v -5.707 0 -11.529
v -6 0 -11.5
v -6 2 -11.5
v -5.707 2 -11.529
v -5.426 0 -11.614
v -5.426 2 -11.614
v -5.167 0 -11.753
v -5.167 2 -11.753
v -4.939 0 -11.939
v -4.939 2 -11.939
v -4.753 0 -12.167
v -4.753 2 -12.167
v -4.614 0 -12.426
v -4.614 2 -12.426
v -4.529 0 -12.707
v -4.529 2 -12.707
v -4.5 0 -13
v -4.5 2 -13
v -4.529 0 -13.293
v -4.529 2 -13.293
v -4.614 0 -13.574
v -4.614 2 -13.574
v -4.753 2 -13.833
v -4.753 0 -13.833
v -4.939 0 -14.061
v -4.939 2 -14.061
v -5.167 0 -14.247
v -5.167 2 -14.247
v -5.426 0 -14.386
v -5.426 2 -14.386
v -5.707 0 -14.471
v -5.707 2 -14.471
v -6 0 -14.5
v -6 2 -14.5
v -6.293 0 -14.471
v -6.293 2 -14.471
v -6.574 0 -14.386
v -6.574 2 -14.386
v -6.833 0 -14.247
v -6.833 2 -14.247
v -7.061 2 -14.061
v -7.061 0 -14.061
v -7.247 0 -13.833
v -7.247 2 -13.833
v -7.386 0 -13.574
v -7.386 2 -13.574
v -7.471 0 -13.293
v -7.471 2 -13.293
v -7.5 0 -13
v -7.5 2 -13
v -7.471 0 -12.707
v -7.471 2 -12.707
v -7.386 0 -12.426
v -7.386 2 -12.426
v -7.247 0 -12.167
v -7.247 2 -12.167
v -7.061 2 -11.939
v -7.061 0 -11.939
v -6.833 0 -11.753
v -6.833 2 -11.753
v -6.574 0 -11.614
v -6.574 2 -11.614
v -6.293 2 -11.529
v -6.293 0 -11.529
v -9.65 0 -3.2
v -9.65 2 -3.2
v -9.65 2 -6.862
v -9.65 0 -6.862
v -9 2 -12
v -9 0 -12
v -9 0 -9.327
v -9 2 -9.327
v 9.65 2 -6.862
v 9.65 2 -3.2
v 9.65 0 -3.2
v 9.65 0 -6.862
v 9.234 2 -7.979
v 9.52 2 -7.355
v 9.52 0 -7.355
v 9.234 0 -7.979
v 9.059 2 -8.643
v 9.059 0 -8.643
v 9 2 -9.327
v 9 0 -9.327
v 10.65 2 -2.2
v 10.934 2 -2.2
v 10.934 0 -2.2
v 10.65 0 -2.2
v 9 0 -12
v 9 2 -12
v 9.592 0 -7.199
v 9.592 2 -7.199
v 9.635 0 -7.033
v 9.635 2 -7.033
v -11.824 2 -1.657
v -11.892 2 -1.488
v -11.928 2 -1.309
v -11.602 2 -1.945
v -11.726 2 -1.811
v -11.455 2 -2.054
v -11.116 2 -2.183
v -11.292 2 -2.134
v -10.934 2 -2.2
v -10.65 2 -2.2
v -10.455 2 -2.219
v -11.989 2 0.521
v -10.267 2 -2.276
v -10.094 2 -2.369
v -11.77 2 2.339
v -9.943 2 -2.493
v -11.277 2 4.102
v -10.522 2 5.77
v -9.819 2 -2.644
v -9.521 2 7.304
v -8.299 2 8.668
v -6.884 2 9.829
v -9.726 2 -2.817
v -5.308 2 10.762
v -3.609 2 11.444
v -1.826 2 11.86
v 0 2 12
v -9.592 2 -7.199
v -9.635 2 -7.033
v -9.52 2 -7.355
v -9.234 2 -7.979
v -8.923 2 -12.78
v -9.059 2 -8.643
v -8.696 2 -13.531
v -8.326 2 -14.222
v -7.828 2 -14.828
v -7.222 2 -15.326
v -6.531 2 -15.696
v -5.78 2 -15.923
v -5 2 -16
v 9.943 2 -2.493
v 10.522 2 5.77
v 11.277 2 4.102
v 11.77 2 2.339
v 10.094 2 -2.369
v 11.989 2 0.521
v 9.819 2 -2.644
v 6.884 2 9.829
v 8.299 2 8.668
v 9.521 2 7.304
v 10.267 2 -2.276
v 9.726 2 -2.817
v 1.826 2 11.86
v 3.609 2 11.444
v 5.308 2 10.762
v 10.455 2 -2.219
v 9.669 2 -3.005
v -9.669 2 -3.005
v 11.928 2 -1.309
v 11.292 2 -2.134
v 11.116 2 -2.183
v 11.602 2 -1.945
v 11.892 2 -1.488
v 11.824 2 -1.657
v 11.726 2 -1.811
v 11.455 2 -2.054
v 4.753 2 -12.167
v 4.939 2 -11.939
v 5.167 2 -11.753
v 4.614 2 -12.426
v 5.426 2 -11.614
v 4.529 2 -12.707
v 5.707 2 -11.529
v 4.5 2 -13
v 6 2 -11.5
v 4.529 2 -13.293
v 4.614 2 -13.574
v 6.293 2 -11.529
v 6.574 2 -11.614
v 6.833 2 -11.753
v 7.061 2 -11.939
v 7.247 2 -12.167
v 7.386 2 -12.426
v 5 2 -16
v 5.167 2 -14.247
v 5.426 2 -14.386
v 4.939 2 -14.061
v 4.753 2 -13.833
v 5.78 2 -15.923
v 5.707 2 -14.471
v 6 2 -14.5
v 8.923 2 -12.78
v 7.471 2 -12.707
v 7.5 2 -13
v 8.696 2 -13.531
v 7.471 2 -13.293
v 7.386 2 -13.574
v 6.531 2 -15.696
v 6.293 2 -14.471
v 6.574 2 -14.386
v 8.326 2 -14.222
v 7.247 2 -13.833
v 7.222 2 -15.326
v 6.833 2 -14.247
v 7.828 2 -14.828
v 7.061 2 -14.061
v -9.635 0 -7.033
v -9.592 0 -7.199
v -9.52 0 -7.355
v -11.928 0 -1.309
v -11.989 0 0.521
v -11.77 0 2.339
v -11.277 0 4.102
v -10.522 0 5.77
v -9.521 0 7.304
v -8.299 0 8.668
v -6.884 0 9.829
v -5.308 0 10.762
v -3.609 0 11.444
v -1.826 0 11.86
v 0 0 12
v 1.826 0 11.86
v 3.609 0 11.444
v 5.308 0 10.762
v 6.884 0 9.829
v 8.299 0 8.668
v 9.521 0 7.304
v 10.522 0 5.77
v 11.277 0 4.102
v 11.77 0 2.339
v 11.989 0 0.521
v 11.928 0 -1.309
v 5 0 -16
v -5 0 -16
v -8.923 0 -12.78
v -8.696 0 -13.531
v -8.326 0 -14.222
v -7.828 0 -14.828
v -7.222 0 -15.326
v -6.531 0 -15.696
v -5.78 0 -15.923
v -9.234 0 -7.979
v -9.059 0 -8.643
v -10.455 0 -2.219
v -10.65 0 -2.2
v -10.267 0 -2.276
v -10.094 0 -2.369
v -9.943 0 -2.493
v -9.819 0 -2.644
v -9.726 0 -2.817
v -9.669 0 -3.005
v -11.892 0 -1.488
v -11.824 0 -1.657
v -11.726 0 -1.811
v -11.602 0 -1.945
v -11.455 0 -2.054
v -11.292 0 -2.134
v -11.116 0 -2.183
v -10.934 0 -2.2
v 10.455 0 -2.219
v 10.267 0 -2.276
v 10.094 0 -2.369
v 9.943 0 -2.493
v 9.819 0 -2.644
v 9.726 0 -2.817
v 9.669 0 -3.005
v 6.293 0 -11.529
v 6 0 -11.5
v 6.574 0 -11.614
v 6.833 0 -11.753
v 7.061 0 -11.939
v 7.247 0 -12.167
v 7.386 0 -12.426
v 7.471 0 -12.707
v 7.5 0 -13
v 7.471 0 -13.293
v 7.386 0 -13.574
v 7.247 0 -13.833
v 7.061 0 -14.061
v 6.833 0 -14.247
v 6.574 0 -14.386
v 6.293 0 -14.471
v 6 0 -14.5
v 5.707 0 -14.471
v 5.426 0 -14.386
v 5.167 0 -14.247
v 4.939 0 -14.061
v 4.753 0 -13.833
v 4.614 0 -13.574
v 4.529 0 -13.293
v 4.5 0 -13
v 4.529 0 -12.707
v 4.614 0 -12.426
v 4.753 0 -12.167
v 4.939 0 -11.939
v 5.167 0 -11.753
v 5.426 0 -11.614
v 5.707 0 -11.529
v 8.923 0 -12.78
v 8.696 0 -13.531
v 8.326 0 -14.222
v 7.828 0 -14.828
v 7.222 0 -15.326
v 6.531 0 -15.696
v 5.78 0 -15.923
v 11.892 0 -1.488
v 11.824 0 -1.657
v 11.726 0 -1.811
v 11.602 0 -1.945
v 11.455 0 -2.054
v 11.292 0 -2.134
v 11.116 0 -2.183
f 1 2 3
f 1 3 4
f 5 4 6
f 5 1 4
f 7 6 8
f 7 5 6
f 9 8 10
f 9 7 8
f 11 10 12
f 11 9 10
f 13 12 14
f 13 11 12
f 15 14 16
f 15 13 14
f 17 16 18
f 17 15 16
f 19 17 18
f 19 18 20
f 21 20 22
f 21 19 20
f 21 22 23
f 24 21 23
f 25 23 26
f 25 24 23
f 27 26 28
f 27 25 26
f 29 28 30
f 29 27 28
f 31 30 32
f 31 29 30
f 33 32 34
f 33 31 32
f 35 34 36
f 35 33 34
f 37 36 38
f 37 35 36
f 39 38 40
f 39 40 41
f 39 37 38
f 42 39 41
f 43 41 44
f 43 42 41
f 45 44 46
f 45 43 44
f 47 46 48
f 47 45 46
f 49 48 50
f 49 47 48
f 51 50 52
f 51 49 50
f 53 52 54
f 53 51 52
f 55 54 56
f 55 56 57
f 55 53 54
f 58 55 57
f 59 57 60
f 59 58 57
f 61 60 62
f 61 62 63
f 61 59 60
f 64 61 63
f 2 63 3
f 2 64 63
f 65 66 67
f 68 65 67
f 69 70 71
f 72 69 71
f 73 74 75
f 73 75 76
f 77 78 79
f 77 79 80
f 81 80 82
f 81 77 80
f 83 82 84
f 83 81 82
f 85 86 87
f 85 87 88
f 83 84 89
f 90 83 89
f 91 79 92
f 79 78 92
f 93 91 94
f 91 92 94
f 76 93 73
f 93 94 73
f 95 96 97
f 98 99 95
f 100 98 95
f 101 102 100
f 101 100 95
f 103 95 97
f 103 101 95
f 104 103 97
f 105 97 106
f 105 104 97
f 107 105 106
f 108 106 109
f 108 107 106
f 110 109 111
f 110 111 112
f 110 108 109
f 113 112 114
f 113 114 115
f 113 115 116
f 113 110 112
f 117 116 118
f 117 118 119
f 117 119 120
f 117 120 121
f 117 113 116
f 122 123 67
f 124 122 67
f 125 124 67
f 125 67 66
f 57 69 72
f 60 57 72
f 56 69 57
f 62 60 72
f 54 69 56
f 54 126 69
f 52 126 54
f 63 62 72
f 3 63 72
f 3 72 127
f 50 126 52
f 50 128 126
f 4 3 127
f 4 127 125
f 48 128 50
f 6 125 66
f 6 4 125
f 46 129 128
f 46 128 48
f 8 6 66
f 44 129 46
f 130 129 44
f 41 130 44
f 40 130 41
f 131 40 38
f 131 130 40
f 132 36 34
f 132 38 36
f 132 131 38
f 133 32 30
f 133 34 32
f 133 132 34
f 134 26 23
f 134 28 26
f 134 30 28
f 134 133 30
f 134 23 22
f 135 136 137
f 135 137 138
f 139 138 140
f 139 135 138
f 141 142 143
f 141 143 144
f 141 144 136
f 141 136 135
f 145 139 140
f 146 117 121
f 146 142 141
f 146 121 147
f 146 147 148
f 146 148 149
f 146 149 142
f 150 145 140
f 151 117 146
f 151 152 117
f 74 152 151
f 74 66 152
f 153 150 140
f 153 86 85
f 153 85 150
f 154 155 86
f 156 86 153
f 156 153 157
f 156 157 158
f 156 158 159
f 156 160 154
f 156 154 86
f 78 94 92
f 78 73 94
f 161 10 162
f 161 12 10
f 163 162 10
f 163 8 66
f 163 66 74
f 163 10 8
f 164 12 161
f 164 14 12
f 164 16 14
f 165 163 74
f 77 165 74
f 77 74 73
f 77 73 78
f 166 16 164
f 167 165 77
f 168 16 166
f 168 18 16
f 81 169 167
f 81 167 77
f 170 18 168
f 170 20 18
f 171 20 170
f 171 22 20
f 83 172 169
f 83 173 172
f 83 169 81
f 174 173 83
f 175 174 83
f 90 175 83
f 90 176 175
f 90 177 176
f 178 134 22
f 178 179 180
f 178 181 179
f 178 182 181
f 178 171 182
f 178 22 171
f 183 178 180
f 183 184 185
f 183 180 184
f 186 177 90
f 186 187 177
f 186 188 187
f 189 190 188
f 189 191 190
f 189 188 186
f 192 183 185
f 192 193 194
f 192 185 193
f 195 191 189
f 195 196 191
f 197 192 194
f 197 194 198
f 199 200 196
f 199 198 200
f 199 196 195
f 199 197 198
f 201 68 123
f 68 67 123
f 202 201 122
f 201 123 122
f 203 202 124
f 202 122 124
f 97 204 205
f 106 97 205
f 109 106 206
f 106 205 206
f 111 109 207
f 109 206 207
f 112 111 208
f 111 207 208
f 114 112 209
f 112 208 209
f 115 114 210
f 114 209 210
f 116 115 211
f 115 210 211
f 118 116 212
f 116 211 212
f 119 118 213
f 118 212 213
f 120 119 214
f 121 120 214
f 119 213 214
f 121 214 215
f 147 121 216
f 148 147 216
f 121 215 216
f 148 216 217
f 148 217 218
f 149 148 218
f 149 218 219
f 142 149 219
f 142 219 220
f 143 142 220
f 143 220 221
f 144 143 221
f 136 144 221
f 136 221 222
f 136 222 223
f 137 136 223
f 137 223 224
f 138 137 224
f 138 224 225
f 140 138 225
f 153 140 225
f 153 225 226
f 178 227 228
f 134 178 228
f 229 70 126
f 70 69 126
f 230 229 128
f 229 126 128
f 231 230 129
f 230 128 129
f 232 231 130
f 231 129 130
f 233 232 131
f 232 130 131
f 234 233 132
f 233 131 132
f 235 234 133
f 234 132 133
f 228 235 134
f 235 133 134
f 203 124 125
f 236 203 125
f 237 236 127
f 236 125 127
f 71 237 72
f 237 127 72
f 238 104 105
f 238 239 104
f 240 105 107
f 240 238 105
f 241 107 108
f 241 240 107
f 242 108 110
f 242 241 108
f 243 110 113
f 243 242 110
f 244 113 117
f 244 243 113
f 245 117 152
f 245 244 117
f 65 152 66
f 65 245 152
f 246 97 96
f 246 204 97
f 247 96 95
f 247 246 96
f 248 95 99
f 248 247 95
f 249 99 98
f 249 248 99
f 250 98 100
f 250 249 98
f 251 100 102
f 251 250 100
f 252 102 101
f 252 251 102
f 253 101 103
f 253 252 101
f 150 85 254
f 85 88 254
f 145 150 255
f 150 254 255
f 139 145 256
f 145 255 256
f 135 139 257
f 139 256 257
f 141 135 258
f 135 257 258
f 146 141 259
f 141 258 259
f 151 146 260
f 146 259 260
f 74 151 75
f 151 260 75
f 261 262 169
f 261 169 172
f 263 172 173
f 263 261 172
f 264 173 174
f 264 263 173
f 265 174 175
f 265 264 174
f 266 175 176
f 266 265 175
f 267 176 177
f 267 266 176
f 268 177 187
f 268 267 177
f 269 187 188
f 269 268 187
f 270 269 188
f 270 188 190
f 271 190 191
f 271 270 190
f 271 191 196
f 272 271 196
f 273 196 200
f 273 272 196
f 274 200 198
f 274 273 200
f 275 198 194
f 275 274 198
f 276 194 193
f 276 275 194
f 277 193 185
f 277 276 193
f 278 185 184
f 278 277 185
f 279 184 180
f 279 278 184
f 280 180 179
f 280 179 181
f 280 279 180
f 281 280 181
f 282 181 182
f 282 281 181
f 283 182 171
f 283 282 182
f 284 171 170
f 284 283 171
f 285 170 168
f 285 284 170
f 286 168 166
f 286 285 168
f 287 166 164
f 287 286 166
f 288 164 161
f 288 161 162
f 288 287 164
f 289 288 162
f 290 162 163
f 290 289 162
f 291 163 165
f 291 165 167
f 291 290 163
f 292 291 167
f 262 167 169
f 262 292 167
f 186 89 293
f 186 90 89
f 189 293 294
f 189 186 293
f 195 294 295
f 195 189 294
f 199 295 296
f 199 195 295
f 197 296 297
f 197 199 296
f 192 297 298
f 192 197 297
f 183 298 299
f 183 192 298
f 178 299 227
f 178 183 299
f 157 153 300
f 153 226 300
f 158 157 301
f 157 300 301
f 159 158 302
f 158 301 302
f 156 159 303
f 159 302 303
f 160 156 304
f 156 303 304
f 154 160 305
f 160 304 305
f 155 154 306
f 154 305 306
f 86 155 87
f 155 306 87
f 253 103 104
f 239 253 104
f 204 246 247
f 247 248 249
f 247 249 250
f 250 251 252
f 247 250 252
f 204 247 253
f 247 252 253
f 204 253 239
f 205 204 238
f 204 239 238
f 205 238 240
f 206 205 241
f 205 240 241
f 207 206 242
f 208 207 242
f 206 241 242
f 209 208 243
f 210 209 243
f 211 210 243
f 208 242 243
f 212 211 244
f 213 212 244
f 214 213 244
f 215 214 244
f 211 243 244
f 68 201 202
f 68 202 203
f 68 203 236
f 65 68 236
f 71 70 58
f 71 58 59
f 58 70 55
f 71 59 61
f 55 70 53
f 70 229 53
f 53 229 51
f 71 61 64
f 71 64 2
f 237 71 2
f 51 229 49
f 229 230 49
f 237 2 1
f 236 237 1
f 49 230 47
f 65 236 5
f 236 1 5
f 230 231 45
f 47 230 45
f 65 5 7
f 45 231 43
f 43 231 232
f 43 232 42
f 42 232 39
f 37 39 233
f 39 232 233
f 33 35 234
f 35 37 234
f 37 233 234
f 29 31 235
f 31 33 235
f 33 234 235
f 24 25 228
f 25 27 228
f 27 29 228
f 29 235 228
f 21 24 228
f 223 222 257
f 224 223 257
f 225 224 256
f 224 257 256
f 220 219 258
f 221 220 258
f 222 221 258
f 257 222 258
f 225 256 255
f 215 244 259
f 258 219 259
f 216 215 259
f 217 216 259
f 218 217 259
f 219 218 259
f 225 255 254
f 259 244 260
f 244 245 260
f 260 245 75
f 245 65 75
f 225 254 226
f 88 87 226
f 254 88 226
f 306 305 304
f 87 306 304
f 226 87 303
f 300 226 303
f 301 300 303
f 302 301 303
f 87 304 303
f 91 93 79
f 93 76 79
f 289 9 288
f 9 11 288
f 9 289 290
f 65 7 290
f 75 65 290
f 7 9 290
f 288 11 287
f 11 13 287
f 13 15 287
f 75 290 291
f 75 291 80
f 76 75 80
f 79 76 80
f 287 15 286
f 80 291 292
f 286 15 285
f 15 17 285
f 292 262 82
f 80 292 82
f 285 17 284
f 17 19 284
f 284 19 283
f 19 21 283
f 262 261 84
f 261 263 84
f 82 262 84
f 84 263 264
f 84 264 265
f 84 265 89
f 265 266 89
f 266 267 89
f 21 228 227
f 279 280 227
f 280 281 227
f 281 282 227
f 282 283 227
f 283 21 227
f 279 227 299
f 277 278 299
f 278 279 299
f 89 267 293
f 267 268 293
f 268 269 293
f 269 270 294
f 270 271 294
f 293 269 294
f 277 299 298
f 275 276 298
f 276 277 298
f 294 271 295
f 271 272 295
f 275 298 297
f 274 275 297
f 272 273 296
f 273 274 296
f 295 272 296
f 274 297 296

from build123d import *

# Parameters (mm, degrees)
SKETCH1_R           = 1.5
BOSS_EXTRUDE1_DEPTH = 2
FILLET2_R           = 4
CUT_EXTRUDE1_DEPTH  = 21.099751242
FILLET3_R           = 1


with BuildPart() as part:
    # Sketch1 → Boss-Extrude1 (new body)
    with BuildSketch(Plane(origin=(0, 0, 0), x_dir=(1, 0, 0), z_dir=(0, 1, 0))):
        with BuildLine():
            Line((-9, 10), (-9, 7.937253933))
            ThreePointArc((-9, 7.937253933), (0, -12), (9, 7.937253933))
            Line((9, 7.937253933), (9, 10))
            Line((9, 10), (9, 16))
            Line((9, 16), (-9, 16))
            Line((-9, 16), (-9, 10))
        make_face()
        with Locations(Location((-6, 13, 0), (0, 0, 270))):
            Circle(SKETCH1_R, mode=Mode.SUBTRACT)
        with Locations(Location((6, 13, 0), (0, 0, 270))):
            Circle(SKETCH1_R, mode=Mode.SUBTRACT)
    extrude(amount=BOSS_EXTRUDE1_DEPTH)

    # Fillet2
    fillet2_edges = [part.edges().sort_by_distance(p)[0] for p in [
        (9, 1, -7.937253933),
        (-9, 1, -7.937253933),
        (-9, 1, -16),
        (9, 1, -16),
    ]]
    fillet(fillet2_edges, radius=FILLET2_R)

    # Sketch2 → Cut-Extrude1 (cut, through all)
    with BuildSketch(Plane(origin=(0, 2, 0), x_dir=(1, 0, 0), z_dir=(0, 1, 0))):
        with BuildLine():
            Line((-11.796609682, 2.2), (-9.65, 2.2))
            Line((-9.65, 2.2), (-9.65, 7.255695723))
            ThreePointArc((-9.65, 7.255695723), (-11.151781756, 4.909775878), (-11.796609682, 2.2))
        make_face()
        with BuildLine():
            Line((9.65, 2.2), (9.65, 7.255695723))
            ThreePointArc((9.65, 7.255695723), (11.151781756, 4.909775878), (11.796609682, 2.2))
            Line((11.796609682, 2.2), (9.65, 2.2))
        make_face()
    extrude(amount=-CUT_EXTRUDE1_DEPTH, mode=Mode.SUBTRACT)

    # Fillet3
    fillet3_edges = [part.edges().sort_by_distance(p)[0] for p in [
        (-9.65, 1, -7.141629754),
        (-11.796609682, 1, -2.2),
        (-9.65, 1, -2.2),
        (9.65, 1, -7.141629754),
        (9.65, 1, -2.2),
        (11.796609682, 1, -2.2),
    ]]
    fillet(fillet3_edges, radius=FILLET3_R)


solid = part.part
